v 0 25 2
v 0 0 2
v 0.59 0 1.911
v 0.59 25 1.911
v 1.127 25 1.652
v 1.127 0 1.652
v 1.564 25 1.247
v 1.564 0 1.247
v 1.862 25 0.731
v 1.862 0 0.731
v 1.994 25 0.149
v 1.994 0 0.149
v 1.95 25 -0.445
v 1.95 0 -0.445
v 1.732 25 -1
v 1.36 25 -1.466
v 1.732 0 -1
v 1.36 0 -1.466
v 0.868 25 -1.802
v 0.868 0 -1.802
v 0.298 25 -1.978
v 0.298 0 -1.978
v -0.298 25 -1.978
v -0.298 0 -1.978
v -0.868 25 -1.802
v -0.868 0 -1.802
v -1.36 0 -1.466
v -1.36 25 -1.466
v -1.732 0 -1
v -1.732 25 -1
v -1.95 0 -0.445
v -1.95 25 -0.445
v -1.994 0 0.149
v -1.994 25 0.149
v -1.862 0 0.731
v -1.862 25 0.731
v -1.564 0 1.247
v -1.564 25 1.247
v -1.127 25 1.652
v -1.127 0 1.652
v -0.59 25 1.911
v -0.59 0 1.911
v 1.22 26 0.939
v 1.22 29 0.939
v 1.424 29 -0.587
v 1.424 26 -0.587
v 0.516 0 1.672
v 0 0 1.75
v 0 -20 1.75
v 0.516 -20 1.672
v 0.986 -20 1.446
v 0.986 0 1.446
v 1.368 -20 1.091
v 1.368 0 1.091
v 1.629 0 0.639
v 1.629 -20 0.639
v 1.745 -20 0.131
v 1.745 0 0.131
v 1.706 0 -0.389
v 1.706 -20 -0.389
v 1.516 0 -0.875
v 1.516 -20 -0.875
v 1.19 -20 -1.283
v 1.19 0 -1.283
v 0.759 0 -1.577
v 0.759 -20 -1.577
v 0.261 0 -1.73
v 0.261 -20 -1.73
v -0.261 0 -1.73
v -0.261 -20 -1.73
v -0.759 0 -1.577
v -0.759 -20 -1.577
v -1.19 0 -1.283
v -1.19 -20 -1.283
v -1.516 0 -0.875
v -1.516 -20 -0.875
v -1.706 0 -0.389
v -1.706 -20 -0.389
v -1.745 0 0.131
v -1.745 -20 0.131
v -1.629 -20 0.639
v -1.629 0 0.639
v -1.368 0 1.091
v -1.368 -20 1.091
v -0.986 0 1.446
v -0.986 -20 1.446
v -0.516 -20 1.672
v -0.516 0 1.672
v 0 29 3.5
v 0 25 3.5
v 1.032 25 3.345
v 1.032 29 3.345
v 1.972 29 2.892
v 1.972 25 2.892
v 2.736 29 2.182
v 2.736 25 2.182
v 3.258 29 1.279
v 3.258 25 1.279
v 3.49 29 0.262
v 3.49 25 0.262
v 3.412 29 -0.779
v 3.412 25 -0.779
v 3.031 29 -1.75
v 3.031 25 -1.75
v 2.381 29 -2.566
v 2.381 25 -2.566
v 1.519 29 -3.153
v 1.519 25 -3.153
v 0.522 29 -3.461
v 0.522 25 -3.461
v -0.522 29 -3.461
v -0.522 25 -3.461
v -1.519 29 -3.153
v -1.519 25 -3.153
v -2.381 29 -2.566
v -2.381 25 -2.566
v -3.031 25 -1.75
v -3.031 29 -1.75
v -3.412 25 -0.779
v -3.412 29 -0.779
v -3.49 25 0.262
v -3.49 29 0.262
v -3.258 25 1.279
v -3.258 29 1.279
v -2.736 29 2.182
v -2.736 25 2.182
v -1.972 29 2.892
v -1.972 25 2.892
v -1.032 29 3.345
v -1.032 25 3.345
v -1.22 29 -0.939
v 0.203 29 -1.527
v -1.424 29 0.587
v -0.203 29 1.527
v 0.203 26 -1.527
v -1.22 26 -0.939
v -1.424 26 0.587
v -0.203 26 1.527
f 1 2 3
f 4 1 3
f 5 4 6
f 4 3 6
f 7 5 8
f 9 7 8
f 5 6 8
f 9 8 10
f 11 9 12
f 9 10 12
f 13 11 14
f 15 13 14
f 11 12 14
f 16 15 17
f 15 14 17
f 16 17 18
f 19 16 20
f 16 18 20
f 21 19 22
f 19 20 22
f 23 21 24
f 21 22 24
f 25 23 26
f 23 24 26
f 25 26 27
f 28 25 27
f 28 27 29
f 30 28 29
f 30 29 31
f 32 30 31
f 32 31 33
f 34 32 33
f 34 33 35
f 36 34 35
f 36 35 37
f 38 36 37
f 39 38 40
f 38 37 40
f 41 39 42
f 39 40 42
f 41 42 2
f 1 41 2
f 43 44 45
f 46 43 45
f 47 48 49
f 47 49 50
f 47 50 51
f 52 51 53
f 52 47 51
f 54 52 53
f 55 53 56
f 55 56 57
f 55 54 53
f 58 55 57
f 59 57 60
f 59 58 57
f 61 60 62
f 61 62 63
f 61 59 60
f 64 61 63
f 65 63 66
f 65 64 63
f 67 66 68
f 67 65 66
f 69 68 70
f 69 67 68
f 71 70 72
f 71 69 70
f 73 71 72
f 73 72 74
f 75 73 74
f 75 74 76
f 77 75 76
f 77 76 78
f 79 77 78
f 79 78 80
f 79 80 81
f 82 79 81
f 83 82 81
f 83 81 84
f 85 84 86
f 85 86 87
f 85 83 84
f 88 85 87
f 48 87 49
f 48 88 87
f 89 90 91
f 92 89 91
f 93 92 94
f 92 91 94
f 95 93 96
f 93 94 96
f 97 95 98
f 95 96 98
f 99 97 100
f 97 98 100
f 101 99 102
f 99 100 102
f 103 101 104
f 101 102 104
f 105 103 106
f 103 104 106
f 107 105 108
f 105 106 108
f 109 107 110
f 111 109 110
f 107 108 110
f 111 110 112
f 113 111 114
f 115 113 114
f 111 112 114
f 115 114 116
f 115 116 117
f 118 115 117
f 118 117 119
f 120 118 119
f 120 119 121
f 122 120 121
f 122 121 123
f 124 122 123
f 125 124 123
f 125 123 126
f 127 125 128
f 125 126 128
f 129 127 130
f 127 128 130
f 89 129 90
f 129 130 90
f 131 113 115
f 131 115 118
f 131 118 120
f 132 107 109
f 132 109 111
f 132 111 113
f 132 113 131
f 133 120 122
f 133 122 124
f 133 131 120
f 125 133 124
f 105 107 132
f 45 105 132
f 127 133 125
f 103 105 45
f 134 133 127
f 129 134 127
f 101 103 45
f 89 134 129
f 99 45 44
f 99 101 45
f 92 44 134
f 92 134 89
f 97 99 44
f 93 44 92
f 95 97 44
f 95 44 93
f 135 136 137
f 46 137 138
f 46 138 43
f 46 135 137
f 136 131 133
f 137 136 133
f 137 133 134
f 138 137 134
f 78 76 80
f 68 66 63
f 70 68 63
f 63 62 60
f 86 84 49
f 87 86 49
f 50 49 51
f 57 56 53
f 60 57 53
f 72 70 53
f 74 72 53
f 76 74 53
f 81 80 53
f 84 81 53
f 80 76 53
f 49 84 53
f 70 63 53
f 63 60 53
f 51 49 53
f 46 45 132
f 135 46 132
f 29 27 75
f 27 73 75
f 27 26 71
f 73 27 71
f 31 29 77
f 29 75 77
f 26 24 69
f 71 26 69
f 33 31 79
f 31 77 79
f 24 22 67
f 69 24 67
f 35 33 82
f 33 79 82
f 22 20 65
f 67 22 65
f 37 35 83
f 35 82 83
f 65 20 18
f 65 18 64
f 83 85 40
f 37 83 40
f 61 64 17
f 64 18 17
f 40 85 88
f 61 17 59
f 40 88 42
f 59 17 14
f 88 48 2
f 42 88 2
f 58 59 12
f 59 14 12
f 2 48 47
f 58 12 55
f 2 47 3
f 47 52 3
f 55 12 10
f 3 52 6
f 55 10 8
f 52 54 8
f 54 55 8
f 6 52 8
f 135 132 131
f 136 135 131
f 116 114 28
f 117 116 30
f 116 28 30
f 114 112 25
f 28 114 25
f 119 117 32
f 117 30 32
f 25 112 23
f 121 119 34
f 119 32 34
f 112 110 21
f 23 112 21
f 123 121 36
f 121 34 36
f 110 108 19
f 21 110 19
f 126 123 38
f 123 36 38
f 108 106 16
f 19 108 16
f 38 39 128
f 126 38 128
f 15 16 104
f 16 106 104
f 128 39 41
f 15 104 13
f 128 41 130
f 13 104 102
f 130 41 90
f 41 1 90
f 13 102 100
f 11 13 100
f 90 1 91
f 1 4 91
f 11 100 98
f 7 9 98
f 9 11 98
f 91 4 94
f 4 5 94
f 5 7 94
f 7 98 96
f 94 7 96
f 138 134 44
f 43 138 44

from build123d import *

# Parameters (mm, degrees)
SKETCH_1_R          = 2
EXTRUDE_1_DEPTH     = 25
SKETCH_1_3_R        = 1.75
EXTRUDE_2_DEPTH     = 20
SKETCH_2_R          = 3.5
EXTRUDE_3_DEPTH     = 4
CUT_EXTRUDE_1_DEPTH = 3


with BuildPart() as part:
    # 草图1 → 凸台-拉伸1 (new body)
    with BuildSketch(Plane(origin=(0, 0, 0), x_dir=(1, 0, 0), z_dir=(0, 1, 0))):
        Circle(SKETCH_1_R)
    extrude(amount=EXTRUDE_1_DEPTH)

    # 草图1<3> → 凸台-拉伸2 (add)
    with BuildSketch(Plane(origin=(0, 0, 0), x_dir=(1, 0, 0), z_dir=(0, 1, 0))):
        Circle(SKETCH_1_3_R)
    extrude(amount=-EXTRUDE_2_DEPTH)

    # 草图2 → 凸台-拉伸3 (add)
    with BuildSketch(Plane(origin=(0, 25, 0), x_dir=(1, 0, 0), z_dir=(0, 1, 0))):
        Circle(SKETCH_2_R)
    extrude(amount=EXTRUDE_3_DEPTH)

    # 草图3 → 切除-拉伸1 (cut)
    with BuildSketch(Plane(origin=(0, 29, 0), x_dir=(1, 0, 0), z_dir=(0, 1, 0))):
        Polygon((1.22041658, -0.939246172), (1.423619335, 0.587288675), (0.203202756, 1.526534847), (-1.22041658, 0.939246172), (-1.423619335, -0.587288675), (-0.203202756, -1.526534847), align=None)
    extrude(amount=-CUT_EXTRUDE_1_DEPTH, mode=Mode.SUBTRACT)


solid = part.part
